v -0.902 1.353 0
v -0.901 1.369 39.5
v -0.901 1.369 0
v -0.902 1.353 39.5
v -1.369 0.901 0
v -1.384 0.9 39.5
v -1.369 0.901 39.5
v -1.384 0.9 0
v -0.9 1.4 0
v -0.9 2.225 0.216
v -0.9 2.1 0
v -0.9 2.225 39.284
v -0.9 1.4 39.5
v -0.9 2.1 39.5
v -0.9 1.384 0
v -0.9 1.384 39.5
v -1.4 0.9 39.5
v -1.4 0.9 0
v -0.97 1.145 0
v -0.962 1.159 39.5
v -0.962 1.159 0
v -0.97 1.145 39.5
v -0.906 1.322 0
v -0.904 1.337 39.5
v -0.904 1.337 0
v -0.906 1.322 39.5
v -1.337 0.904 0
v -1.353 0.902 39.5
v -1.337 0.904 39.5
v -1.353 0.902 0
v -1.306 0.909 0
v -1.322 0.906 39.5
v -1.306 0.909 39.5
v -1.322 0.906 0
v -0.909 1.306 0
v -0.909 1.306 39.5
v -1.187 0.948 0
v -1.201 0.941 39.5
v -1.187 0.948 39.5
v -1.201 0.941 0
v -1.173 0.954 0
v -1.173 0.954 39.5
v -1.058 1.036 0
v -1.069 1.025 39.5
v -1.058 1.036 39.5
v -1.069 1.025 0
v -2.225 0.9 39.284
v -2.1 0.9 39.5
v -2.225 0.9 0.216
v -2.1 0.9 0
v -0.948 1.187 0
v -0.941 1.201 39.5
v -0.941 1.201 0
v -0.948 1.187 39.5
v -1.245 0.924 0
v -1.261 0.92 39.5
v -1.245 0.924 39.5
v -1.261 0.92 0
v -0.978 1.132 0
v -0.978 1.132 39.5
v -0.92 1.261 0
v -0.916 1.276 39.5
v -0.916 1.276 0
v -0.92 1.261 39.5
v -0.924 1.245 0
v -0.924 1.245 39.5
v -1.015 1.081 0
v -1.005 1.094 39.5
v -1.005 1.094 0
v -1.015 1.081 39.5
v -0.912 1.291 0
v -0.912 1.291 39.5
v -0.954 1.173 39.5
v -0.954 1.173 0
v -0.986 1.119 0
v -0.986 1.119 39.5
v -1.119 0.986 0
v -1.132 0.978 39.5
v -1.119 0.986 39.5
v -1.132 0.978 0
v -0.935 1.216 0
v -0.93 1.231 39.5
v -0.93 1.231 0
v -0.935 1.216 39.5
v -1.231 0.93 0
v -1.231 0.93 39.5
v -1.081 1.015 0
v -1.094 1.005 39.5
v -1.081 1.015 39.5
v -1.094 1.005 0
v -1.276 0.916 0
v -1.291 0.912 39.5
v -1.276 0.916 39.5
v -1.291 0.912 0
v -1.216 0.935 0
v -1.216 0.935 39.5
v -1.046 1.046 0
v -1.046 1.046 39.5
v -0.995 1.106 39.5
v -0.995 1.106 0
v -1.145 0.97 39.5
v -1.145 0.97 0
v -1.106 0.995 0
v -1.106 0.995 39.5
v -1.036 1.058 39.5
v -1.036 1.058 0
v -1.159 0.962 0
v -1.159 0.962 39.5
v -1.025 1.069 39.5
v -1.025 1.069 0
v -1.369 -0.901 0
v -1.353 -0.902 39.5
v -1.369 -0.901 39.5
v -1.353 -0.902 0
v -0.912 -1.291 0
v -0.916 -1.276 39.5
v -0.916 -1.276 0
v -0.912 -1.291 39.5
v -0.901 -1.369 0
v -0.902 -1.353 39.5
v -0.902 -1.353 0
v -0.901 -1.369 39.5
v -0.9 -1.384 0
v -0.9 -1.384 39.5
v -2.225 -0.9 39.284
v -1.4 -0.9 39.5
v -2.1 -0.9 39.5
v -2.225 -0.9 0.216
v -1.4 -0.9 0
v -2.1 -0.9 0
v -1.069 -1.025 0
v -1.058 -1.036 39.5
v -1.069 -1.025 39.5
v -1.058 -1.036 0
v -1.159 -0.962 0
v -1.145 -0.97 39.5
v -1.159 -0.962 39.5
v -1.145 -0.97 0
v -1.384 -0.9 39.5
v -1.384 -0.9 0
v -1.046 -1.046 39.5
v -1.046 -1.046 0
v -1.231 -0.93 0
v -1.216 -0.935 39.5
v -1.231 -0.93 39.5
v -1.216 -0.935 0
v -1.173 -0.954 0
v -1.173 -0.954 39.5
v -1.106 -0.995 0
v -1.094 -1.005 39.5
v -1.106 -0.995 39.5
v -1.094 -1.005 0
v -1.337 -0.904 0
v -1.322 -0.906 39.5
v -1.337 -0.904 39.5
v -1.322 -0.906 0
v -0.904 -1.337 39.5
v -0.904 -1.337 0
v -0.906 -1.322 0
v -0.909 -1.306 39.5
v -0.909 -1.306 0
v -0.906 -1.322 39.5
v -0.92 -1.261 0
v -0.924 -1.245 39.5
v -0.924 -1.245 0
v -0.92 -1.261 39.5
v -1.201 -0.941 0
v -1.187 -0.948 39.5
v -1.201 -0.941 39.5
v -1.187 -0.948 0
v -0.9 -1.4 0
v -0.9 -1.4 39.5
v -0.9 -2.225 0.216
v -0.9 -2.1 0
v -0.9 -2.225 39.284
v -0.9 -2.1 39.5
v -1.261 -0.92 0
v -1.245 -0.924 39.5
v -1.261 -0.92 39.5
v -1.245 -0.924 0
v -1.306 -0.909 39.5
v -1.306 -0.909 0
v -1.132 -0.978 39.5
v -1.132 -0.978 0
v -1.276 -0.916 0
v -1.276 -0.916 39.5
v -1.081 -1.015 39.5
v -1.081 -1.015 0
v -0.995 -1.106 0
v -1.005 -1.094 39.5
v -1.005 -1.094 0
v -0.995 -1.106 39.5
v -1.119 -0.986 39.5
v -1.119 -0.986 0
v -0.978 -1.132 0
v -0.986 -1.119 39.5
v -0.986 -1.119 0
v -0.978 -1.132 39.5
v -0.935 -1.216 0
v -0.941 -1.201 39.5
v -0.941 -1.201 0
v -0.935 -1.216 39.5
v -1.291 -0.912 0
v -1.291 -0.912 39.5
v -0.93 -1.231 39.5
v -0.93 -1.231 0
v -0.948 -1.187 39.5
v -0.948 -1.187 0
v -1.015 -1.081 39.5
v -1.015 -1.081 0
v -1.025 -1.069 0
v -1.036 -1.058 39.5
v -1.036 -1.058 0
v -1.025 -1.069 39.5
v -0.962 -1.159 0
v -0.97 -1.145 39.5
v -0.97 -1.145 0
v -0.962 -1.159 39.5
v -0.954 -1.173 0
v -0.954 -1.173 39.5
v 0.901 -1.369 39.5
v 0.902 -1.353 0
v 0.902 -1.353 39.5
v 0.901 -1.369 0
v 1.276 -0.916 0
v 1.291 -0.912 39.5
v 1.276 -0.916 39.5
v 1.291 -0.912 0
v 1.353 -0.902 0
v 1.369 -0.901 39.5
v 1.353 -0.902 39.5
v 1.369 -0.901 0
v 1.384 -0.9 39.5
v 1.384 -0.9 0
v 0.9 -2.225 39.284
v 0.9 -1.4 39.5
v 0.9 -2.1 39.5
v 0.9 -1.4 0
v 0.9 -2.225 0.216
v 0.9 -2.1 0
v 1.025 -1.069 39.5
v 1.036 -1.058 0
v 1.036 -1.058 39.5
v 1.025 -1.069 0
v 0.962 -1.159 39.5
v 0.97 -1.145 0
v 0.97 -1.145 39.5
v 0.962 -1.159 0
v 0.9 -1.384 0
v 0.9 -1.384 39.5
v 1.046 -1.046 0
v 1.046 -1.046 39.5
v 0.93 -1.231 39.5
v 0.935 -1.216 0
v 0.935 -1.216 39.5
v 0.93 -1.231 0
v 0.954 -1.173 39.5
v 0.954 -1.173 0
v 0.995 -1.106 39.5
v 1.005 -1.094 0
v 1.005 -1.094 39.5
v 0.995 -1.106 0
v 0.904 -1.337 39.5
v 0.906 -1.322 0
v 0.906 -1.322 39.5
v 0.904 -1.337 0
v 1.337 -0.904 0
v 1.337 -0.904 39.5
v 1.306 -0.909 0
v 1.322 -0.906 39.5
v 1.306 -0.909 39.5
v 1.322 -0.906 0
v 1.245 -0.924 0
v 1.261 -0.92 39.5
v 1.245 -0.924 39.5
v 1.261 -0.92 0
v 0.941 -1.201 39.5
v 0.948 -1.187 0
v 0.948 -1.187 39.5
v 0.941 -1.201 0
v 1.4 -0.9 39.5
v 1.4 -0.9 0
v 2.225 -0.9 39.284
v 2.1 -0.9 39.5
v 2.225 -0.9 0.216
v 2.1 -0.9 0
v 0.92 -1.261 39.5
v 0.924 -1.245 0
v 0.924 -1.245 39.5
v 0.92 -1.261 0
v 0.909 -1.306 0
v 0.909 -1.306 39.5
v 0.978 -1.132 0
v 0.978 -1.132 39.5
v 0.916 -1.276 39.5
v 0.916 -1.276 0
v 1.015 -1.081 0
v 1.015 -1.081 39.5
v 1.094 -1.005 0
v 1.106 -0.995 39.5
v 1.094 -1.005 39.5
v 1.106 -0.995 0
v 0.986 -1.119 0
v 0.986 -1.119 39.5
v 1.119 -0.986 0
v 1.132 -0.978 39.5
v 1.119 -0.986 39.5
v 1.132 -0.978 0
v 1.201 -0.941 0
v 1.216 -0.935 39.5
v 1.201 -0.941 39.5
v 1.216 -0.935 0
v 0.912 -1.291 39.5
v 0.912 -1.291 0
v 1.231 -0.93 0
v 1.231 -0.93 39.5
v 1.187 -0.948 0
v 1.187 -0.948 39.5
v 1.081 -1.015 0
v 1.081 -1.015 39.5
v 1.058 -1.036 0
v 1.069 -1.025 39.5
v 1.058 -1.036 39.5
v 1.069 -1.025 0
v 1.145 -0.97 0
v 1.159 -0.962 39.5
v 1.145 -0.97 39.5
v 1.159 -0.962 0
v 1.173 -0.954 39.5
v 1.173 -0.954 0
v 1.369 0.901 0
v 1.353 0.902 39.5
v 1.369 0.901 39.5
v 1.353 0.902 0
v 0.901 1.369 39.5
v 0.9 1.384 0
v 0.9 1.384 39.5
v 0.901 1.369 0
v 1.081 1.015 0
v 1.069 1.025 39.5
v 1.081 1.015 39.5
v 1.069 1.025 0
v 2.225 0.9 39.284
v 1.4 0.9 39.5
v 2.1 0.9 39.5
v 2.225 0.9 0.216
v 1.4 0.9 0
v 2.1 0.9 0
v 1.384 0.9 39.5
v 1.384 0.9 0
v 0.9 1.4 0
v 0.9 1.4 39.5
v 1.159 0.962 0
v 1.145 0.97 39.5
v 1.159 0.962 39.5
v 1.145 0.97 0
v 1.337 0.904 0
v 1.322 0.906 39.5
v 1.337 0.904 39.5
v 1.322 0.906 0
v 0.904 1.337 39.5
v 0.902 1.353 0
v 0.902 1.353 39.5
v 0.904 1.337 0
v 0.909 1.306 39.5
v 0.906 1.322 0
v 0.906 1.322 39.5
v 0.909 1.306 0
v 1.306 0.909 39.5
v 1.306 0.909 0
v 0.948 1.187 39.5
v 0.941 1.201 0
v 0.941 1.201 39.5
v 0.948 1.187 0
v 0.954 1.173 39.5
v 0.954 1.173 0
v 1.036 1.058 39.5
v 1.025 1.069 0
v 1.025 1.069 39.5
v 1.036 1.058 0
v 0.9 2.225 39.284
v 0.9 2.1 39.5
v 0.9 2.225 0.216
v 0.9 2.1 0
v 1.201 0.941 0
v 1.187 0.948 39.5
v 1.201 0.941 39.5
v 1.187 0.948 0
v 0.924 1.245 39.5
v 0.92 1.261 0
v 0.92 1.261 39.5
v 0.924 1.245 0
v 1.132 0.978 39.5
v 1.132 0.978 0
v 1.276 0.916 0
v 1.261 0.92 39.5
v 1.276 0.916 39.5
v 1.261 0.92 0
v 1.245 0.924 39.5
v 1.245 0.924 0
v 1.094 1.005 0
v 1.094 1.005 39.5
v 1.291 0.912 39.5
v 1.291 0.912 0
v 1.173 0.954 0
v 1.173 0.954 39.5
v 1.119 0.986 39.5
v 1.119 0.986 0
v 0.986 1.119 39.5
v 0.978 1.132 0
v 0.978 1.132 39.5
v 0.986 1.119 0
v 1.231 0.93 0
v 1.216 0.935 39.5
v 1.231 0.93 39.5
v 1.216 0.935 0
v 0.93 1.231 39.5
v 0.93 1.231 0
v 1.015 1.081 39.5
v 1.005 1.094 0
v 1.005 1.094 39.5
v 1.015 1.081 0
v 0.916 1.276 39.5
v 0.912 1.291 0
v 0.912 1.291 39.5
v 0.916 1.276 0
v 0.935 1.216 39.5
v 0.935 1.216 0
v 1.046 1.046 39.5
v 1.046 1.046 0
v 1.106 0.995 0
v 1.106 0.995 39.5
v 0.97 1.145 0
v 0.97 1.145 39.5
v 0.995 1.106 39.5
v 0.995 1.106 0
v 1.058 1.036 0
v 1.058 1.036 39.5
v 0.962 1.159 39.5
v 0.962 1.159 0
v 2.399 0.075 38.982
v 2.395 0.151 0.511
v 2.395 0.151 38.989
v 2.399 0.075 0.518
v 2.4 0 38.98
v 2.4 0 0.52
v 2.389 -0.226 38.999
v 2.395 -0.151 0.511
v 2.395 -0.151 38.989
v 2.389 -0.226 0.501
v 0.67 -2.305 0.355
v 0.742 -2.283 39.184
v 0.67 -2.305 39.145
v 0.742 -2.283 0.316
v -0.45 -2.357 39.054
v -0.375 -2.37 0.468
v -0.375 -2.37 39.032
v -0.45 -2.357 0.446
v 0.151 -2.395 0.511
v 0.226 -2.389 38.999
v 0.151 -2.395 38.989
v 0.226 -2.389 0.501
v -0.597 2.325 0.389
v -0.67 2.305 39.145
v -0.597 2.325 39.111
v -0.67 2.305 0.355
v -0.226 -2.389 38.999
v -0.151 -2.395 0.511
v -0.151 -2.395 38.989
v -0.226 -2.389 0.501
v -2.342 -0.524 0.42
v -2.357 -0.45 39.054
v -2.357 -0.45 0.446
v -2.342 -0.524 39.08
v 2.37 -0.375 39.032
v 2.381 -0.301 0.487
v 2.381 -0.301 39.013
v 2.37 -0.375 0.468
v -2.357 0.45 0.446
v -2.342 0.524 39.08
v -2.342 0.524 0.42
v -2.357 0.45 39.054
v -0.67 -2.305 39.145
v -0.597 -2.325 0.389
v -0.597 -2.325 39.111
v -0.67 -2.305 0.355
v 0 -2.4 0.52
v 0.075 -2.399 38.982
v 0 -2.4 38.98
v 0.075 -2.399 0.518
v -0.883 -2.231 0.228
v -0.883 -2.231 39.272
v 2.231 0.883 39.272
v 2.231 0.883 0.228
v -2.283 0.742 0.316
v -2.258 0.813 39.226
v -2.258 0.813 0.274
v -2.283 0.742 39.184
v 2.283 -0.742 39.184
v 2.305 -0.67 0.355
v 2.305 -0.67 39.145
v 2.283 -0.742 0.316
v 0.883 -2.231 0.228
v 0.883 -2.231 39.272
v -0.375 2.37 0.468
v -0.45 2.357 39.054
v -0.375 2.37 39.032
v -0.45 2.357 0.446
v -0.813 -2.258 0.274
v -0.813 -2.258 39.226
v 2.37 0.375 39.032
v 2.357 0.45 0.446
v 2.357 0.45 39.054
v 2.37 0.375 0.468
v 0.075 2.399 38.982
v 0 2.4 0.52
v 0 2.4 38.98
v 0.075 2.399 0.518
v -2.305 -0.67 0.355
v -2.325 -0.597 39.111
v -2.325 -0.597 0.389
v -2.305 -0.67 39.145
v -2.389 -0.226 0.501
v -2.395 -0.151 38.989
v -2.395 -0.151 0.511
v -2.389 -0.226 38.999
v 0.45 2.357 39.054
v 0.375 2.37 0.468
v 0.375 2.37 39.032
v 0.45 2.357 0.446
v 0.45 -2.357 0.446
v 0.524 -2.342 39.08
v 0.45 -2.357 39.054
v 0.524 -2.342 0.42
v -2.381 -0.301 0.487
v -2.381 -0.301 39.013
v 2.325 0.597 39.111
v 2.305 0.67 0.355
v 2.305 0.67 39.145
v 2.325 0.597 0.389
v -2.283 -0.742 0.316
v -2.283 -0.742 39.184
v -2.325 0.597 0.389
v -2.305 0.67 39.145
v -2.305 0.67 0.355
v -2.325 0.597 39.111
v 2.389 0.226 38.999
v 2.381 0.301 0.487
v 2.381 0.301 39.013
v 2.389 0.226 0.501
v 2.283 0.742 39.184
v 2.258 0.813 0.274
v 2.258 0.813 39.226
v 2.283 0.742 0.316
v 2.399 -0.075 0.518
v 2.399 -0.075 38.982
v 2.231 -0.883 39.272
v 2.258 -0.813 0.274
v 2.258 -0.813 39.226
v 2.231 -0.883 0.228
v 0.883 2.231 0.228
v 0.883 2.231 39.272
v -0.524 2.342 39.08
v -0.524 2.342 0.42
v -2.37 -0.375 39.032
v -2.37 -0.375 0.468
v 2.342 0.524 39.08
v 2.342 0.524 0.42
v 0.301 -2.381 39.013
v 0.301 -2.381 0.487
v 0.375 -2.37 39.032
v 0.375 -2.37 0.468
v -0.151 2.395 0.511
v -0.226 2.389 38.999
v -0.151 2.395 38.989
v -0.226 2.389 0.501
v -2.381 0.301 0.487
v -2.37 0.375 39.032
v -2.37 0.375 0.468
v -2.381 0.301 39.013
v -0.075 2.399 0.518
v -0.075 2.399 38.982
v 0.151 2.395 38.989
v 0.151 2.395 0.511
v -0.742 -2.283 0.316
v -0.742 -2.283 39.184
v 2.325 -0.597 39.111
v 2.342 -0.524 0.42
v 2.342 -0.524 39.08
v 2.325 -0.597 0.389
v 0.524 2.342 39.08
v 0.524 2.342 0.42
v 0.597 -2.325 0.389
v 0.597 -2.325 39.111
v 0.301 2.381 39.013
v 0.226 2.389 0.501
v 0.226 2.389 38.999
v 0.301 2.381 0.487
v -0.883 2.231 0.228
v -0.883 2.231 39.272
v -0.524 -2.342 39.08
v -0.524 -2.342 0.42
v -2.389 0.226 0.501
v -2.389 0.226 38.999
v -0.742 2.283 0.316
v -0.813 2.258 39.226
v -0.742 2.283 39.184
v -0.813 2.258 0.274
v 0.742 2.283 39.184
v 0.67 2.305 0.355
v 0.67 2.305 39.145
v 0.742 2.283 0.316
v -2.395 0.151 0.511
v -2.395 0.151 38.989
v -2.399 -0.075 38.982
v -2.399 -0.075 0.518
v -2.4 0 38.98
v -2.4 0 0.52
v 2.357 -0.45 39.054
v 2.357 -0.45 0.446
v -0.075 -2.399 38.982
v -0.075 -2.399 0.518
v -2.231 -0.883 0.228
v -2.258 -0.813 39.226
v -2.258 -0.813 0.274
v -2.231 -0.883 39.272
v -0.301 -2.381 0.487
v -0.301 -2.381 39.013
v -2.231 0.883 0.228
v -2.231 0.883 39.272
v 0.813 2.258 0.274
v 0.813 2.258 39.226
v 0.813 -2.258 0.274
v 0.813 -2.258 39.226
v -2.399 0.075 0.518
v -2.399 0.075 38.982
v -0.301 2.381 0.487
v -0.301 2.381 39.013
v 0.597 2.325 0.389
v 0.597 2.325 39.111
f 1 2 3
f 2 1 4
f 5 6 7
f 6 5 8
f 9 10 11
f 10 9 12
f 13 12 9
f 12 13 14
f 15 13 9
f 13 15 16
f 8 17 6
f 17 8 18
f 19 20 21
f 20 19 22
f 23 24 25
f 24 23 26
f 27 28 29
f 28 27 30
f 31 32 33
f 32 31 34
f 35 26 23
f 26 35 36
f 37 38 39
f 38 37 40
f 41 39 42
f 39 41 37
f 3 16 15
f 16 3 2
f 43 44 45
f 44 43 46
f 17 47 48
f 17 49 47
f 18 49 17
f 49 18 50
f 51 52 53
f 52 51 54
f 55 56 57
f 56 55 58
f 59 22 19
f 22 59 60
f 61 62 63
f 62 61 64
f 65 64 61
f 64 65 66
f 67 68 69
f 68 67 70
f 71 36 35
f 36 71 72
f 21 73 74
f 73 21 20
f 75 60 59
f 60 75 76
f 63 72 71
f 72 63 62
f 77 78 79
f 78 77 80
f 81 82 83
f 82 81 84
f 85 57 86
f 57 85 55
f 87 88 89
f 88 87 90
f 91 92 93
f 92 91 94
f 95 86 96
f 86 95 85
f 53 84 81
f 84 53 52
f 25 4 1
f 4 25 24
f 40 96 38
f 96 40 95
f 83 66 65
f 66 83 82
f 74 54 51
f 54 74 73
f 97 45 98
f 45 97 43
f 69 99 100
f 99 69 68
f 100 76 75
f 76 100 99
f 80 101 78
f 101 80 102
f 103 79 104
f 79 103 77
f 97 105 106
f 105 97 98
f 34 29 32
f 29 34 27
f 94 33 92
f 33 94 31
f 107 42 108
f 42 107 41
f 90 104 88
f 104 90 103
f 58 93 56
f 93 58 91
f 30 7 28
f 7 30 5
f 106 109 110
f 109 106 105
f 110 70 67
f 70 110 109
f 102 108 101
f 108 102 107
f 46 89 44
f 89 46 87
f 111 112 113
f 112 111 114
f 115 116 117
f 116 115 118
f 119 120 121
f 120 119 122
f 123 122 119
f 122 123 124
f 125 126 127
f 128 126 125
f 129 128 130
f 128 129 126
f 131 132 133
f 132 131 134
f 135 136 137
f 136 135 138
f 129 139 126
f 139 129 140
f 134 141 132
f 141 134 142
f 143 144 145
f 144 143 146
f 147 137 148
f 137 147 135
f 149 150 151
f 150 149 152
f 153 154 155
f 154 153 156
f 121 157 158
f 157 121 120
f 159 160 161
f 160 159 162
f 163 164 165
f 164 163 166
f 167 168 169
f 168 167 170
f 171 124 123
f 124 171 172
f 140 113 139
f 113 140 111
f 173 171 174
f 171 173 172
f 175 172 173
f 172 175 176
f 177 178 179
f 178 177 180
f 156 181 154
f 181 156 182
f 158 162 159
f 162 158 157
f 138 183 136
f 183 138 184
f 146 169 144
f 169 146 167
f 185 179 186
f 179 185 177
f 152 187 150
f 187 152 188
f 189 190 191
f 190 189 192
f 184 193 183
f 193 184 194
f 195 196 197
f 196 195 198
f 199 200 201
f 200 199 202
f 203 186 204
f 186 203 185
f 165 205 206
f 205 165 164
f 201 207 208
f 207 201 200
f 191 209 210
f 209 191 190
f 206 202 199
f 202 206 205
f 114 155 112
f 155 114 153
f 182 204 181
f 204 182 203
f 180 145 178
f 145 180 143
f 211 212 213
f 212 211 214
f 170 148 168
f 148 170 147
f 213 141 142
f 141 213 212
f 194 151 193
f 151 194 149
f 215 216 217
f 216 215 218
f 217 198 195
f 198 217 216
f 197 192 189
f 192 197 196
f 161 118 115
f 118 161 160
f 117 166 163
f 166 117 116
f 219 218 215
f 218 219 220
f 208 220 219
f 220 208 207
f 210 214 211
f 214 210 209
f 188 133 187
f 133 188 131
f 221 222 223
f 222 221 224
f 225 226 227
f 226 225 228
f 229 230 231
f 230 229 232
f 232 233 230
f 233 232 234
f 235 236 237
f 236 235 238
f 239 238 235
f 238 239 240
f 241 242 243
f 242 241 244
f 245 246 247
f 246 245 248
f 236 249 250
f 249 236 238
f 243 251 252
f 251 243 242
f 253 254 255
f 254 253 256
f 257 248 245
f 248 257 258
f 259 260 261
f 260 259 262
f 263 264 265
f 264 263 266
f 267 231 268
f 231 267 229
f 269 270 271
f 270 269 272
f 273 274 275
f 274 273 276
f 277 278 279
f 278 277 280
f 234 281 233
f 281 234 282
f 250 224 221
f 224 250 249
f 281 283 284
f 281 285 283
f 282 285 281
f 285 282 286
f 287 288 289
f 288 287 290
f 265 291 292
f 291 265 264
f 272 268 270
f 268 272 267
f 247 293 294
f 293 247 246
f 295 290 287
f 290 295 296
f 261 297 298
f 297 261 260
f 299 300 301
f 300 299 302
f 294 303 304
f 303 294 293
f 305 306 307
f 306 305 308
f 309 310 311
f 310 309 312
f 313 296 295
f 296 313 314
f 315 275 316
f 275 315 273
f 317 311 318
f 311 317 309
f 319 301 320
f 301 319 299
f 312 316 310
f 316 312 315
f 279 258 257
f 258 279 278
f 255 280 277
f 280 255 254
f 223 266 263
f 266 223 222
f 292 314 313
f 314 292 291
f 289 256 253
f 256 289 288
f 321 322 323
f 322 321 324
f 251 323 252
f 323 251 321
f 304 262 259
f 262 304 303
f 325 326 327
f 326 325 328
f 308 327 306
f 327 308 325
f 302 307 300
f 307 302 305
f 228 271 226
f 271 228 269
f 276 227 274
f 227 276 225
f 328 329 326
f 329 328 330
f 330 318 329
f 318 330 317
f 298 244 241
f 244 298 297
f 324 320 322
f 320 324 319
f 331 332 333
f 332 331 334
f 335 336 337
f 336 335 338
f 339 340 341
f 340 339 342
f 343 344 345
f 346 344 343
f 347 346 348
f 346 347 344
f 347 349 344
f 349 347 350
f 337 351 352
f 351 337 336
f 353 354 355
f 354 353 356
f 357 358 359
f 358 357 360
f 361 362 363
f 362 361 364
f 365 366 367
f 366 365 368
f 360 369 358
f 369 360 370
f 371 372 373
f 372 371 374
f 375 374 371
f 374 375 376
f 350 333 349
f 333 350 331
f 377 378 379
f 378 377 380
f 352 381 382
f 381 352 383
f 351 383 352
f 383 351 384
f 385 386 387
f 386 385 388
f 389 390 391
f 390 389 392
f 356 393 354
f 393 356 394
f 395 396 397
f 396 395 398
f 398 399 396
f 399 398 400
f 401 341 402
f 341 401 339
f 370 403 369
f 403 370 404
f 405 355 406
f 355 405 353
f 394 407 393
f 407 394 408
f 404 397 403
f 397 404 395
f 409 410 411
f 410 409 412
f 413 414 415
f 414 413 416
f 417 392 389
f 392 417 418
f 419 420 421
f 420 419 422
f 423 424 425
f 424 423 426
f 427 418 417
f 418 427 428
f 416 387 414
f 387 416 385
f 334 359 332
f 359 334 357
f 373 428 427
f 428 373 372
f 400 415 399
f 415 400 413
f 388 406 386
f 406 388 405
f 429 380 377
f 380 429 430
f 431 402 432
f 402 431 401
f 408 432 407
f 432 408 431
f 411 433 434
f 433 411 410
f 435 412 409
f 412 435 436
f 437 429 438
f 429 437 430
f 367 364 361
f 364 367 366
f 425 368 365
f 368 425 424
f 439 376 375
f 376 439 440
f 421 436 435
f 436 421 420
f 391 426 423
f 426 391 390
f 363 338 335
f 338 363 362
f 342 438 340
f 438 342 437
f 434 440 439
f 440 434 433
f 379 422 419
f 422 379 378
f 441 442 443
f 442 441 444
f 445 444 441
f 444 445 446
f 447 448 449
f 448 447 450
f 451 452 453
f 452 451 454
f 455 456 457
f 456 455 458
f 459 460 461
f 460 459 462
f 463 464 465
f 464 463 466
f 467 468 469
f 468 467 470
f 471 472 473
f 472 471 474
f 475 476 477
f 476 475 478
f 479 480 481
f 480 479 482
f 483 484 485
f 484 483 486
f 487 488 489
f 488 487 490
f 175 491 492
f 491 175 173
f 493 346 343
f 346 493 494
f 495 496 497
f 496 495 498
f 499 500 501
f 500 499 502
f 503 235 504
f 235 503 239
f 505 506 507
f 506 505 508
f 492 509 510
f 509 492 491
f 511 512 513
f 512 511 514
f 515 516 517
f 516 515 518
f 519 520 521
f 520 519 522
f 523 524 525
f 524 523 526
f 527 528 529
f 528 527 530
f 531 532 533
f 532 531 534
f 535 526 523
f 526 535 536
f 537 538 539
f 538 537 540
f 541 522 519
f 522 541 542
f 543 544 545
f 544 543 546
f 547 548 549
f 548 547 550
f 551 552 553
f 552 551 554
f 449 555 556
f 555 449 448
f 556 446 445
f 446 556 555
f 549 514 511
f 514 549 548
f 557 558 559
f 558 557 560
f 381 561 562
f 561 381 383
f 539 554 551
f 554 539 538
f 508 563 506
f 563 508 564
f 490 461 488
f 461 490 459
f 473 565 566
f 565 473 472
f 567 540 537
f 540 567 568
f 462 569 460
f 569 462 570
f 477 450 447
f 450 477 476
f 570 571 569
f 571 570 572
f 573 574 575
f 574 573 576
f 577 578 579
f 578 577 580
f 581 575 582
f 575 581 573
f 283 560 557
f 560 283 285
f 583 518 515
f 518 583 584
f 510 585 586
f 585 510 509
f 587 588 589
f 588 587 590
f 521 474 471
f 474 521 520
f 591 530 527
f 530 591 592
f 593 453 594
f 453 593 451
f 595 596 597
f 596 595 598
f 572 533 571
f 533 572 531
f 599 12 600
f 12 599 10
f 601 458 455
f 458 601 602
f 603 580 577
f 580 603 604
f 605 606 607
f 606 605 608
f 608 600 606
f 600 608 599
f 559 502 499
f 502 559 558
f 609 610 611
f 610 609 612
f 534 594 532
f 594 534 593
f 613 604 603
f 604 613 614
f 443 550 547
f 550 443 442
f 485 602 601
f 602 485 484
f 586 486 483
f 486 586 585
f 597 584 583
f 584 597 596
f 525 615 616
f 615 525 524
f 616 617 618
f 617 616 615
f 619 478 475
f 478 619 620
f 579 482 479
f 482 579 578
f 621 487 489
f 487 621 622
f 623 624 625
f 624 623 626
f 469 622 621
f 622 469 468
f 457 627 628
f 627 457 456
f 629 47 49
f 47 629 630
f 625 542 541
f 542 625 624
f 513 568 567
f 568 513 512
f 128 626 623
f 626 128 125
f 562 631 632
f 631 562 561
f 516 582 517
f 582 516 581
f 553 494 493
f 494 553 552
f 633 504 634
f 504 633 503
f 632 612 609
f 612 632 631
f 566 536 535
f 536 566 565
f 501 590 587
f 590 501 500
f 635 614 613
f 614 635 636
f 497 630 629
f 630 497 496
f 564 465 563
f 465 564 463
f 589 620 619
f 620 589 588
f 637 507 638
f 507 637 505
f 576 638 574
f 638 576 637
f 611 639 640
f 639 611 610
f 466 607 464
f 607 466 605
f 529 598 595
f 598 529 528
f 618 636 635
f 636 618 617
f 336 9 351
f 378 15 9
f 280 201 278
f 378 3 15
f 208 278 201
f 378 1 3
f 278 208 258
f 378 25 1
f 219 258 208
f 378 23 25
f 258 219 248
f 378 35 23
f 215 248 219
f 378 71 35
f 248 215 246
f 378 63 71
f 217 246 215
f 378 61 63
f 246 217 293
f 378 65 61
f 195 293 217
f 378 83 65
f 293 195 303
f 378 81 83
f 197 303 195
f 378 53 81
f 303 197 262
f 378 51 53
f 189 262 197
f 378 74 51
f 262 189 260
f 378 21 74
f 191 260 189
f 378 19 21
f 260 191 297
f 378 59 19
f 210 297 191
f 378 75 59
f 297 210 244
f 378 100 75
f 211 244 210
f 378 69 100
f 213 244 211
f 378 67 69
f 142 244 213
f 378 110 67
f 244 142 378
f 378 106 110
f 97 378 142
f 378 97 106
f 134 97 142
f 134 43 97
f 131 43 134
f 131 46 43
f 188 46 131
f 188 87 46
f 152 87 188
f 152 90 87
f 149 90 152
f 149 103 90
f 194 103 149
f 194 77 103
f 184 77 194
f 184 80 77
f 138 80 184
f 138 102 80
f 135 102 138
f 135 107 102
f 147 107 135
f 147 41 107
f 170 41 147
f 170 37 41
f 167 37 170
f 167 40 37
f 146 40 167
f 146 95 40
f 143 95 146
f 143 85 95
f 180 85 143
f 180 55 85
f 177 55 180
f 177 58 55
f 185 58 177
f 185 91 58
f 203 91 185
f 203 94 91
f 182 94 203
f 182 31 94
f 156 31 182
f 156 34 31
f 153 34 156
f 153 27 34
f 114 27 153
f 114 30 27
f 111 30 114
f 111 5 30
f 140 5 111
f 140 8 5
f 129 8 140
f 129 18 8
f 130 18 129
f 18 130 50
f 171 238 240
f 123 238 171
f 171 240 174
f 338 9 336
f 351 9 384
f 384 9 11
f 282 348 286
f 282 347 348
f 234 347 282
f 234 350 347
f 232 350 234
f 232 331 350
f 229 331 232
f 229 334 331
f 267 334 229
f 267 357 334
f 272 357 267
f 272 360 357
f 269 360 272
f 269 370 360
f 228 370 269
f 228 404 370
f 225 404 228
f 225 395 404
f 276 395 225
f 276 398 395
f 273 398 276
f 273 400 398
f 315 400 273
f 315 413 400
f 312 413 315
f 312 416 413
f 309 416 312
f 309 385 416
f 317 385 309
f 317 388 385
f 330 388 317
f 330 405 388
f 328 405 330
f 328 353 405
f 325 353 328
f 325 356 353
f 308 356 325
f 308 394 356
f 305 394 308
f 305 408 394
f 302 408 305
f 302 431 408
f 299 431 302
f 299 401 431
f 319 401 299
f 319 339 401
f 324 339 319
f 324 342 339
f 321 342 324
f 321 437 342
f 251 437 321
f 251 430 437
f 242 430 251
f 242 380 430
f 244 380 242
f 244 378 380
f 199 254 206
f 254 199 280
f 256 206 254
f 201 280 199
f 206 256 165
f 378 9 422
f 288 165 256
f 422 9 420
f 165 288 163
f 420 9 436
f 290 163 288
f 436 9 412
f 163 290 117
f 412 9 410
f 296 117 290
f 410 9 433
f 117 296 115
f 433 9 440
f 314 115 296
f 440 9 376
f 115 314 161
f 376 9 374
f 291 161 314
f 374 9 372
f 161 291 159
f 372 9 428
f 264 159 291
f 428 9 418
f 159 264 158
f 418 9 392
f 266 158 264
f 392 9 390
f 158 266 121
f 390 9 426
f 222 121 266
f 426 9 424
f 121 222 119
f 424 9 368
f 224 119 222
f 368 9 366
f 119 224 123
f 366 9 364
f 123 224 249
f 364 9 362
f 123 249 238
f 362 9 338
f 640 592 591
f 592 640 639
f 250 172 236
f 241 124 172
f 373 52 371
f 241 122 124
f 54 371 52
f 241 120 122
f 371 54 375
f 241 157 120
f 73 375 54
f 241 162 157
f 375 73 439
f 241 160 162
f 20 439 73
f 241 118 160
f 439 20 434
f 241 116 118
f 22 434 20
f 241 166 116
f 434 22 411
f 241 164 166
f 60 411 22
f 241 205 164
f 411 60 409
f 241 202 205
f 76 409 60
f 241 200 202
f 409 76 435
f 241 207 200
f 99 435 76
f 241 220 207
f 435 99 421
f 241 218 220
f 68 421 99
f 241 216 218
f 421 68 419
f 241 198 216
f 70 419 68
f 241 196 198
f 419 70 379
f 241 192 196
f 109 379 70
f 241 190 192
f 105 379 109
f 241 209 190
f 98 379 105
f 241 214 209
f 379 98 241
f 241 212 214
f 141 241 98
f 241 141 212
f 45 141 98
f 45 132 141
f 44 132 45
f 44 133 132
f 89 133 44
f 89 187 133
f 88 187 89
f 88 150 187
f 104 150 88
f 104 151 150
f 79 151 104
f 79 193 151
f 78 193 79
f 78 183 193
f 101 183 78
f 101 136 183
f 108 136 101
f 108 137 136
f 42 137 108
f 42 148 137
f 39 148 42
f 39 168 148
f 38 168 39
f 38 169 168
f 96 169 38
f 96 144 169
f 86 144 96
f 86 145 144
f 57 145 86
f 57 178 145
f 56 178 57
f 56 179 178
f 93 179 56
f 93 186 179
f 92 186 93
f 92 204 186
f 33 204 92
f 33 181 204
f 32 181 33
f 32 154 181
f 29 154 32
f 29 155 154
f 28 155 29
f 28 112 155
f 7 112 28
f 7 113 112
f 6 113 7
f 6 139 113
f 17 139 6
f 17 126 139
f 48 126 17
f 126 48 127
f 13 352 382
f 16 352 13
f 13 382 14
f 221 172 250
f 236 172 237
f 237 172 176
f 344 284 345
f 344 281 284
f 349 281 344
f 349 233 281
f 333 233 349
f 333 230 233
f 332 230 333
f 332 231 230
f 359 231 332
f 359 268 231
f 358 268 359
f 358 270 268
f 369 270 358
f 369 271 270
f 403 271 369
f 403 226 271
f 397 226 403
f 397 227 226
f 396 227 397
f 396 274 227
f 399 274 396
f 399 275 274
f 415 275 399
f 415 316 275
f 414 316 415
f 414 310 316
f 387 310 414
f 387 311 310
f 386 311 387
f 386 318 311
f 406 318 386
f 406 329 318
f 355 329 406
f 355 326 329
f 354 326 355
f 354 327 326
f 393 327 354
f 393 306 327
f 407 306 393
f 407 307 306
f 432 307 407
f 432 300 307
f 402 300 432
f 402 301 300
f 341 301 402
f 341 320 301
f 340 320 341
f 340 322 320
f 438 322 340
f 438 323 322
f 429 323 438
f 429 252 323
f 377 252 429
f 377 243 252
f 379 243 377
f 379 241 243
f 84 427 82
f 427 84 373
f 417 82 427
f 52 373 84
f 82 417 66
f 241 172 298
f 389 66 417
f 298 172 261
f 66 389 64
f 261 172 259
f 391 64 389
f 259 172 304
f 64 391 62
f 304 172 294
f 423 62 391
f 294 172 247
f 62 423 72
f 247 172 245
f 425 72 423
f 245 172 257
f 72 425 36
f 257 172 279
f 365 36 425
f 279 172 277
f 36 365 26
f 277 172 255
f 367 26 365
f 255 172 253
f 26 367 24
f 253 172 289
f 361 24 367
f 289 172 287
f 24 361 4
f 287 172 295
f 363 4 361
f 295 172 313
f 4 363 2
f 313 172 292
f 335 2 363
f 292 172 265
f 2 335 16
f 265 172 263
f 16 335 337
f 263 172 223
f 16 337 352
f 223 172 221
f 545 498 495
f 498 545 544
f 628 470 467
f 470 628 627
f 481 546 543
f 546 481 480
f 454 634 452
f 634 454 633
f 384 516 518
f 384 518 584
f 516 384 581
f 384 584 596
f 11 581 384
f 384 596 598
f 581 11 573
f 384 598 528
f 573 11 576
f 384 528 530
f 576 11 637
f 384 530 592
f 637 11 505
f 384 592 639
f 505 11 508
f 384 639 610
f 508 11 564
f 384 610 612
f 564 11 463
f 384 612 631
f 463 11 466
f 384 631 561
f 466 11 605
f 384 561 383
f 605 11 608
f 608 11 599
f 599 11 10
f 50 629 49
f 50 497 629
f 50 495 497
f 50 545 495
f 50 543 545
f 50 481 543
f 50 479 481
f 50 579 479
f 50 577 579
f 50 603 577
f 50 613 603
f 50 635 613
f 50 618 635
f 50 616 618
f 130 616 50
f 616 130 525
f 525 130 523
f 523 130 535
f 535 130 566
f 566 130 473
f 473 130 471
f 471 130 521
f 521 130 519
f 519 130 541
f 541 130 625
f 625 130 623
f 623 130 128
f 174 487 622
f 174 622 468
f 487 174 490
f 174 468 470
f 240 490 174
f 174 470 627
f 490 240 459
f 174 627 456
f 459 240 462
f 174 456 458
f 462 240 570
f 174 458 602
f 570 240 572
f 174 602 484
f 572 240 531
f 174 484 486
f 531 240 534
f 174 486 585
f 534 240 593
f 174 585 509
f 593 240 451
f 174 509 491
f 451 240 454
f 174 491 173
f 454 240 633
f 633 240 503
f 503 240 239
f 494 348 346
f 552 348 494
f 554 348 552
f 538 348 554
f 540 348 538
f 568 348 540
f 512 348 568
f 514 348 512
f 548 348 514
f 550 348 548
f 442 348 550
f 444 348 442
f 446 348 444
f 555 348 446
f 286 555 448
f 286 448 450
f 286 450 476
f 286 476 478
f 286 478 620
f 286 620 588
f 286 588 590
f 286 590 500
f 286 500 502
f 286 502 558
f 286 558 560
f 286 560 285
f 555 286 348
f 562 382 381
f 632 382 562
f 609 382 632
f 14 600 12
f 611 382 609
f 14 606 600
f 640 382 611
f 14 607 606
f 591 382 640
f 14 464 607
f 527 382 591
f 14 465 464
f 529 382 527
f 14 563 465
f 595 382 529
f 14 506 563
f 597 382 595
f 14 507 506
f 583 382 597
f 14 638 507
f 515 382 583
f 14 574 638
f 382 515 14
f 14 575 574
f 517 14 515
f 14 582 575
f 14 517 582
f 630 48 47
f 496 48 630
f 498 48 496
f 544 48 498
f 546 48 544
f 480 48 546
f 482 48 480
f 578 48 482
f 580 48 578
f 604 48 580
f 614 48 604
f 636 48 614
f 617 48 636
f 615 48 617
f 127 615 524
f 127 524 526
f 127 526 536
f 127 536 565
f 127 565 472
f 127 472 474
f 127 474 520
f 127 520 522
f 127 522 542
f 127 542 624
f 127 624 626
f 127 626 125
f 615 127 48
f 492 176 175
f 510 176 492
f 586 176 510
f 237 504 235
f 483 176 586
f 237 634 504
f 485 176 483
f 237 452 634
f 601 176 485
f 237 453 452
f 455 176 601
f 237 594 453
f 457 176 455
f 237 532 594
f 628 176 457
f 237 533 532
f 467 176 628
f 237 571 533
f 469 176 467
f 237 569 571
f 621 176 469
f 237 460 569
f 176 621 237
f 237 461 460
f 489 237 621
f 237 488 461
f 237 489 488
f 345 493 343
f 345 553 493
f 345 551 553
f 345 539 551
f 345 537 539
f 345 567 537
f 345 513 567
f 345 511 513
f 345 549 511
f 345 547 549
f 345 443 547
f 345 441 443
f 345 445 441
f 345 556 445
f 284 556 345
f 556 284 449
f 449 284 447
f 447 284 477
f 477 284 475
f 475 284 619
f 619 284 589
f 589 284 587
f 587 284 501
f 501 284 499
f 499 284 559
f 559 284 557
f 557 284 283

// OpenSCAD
eps = 0.001;

modelScale = 1.0;


nrOfUnits = 5;
addScrewHole = false;
rScrewHole = 3.0/2/2.5;


// printability corrections; values should be zero for real object dimensions 
PRINTABLE = 0;
correction_r1 = PRINTABLE ? 0.1 : 0.0;
correction_r2 = PRINTABLE ? 0.1 : 0.0;




// axle
r1 = (4.8/2 + correction_r1)*modelScale;
r2 = (1.0/2 + correction_r2)*modelScale;
offset_r2 = 1.4*modelScale;

axleBaseLength = -0.5*modelScale;
axleLengthUnit = 8.0*modelScale;


// camfer
camferAngle = 60;
camferWidth = 0.3;



module drawCamferSingle()
{
    smallSize = 4*r1;
    translate([0,r1-camferWidth,0]) rotate([camferAngle,0,0]) translate([-smallSize/2,-smallSize/2,-smallSize]) cube([smallSize,smallSize,smallSize]);
}


module drawCamfer()
{
    drawCamferSingle();
    rotate([0,0,90]) drawCamferSingle();
    rotate([0,0,180]) drawCamferSingle();
    rotate([0,0,270]) drawCamferSingle();
}


module drawAxleCutOut(prmLength)
{
    smallSize = 6*r2;   
    translate([-offset_r2,offset_r2,0]) hull()
    {
        translate([0,0,-eps]) cylinder(prmLength+2*eps,r2,r2,$fn=200*modelScale);
        translate([-smallSize,-r2,-eps]) cube([eps,2*r2,prmLength+2*eps]);
        translate([-r2,smallSize,-eps]) cube([2*r2,eps,prmLength+2*eps]);
    }
}    


module drawAxleEx(prmLength)
{	
    echo("prmLength",prmLength);
	difference()
	{
		union()
		{
			cylinder(prmLength,r1,r1,$fn=200*modelScale);
		}
		union()
		{
            drawAxleCutOut(prmLength);
            rotate([0,0,90]) drawAxleCutOut(prmLength);
            rotate([0,0,180]) drawAxleCutOut(prmLength);
            rotate([0,0,270]) drawAxleCutOut(prmLength);
		}
	}
}


module drawAxle()
{
    length = axleBaseLength+nrOfUnits*axleLengthUnit;
    difference()
	{
        union()
        {
            drawAxleEx(length);
        }
        union()
        {
            if (addScrewHole)
            {
                translate([0,0,-2*eps]) cylinder(length+4*eps,rScrewHole,rScrewHole,$fn=50*modelScale);
            }
            drawCamfer();
            translate([0,0,length]) mirror([0,0,1]) drawCamfer();
        }
    }
}


// tests
//drawCamfer();
//drawAxleCutOut(2);


// parts
drawAxle();
